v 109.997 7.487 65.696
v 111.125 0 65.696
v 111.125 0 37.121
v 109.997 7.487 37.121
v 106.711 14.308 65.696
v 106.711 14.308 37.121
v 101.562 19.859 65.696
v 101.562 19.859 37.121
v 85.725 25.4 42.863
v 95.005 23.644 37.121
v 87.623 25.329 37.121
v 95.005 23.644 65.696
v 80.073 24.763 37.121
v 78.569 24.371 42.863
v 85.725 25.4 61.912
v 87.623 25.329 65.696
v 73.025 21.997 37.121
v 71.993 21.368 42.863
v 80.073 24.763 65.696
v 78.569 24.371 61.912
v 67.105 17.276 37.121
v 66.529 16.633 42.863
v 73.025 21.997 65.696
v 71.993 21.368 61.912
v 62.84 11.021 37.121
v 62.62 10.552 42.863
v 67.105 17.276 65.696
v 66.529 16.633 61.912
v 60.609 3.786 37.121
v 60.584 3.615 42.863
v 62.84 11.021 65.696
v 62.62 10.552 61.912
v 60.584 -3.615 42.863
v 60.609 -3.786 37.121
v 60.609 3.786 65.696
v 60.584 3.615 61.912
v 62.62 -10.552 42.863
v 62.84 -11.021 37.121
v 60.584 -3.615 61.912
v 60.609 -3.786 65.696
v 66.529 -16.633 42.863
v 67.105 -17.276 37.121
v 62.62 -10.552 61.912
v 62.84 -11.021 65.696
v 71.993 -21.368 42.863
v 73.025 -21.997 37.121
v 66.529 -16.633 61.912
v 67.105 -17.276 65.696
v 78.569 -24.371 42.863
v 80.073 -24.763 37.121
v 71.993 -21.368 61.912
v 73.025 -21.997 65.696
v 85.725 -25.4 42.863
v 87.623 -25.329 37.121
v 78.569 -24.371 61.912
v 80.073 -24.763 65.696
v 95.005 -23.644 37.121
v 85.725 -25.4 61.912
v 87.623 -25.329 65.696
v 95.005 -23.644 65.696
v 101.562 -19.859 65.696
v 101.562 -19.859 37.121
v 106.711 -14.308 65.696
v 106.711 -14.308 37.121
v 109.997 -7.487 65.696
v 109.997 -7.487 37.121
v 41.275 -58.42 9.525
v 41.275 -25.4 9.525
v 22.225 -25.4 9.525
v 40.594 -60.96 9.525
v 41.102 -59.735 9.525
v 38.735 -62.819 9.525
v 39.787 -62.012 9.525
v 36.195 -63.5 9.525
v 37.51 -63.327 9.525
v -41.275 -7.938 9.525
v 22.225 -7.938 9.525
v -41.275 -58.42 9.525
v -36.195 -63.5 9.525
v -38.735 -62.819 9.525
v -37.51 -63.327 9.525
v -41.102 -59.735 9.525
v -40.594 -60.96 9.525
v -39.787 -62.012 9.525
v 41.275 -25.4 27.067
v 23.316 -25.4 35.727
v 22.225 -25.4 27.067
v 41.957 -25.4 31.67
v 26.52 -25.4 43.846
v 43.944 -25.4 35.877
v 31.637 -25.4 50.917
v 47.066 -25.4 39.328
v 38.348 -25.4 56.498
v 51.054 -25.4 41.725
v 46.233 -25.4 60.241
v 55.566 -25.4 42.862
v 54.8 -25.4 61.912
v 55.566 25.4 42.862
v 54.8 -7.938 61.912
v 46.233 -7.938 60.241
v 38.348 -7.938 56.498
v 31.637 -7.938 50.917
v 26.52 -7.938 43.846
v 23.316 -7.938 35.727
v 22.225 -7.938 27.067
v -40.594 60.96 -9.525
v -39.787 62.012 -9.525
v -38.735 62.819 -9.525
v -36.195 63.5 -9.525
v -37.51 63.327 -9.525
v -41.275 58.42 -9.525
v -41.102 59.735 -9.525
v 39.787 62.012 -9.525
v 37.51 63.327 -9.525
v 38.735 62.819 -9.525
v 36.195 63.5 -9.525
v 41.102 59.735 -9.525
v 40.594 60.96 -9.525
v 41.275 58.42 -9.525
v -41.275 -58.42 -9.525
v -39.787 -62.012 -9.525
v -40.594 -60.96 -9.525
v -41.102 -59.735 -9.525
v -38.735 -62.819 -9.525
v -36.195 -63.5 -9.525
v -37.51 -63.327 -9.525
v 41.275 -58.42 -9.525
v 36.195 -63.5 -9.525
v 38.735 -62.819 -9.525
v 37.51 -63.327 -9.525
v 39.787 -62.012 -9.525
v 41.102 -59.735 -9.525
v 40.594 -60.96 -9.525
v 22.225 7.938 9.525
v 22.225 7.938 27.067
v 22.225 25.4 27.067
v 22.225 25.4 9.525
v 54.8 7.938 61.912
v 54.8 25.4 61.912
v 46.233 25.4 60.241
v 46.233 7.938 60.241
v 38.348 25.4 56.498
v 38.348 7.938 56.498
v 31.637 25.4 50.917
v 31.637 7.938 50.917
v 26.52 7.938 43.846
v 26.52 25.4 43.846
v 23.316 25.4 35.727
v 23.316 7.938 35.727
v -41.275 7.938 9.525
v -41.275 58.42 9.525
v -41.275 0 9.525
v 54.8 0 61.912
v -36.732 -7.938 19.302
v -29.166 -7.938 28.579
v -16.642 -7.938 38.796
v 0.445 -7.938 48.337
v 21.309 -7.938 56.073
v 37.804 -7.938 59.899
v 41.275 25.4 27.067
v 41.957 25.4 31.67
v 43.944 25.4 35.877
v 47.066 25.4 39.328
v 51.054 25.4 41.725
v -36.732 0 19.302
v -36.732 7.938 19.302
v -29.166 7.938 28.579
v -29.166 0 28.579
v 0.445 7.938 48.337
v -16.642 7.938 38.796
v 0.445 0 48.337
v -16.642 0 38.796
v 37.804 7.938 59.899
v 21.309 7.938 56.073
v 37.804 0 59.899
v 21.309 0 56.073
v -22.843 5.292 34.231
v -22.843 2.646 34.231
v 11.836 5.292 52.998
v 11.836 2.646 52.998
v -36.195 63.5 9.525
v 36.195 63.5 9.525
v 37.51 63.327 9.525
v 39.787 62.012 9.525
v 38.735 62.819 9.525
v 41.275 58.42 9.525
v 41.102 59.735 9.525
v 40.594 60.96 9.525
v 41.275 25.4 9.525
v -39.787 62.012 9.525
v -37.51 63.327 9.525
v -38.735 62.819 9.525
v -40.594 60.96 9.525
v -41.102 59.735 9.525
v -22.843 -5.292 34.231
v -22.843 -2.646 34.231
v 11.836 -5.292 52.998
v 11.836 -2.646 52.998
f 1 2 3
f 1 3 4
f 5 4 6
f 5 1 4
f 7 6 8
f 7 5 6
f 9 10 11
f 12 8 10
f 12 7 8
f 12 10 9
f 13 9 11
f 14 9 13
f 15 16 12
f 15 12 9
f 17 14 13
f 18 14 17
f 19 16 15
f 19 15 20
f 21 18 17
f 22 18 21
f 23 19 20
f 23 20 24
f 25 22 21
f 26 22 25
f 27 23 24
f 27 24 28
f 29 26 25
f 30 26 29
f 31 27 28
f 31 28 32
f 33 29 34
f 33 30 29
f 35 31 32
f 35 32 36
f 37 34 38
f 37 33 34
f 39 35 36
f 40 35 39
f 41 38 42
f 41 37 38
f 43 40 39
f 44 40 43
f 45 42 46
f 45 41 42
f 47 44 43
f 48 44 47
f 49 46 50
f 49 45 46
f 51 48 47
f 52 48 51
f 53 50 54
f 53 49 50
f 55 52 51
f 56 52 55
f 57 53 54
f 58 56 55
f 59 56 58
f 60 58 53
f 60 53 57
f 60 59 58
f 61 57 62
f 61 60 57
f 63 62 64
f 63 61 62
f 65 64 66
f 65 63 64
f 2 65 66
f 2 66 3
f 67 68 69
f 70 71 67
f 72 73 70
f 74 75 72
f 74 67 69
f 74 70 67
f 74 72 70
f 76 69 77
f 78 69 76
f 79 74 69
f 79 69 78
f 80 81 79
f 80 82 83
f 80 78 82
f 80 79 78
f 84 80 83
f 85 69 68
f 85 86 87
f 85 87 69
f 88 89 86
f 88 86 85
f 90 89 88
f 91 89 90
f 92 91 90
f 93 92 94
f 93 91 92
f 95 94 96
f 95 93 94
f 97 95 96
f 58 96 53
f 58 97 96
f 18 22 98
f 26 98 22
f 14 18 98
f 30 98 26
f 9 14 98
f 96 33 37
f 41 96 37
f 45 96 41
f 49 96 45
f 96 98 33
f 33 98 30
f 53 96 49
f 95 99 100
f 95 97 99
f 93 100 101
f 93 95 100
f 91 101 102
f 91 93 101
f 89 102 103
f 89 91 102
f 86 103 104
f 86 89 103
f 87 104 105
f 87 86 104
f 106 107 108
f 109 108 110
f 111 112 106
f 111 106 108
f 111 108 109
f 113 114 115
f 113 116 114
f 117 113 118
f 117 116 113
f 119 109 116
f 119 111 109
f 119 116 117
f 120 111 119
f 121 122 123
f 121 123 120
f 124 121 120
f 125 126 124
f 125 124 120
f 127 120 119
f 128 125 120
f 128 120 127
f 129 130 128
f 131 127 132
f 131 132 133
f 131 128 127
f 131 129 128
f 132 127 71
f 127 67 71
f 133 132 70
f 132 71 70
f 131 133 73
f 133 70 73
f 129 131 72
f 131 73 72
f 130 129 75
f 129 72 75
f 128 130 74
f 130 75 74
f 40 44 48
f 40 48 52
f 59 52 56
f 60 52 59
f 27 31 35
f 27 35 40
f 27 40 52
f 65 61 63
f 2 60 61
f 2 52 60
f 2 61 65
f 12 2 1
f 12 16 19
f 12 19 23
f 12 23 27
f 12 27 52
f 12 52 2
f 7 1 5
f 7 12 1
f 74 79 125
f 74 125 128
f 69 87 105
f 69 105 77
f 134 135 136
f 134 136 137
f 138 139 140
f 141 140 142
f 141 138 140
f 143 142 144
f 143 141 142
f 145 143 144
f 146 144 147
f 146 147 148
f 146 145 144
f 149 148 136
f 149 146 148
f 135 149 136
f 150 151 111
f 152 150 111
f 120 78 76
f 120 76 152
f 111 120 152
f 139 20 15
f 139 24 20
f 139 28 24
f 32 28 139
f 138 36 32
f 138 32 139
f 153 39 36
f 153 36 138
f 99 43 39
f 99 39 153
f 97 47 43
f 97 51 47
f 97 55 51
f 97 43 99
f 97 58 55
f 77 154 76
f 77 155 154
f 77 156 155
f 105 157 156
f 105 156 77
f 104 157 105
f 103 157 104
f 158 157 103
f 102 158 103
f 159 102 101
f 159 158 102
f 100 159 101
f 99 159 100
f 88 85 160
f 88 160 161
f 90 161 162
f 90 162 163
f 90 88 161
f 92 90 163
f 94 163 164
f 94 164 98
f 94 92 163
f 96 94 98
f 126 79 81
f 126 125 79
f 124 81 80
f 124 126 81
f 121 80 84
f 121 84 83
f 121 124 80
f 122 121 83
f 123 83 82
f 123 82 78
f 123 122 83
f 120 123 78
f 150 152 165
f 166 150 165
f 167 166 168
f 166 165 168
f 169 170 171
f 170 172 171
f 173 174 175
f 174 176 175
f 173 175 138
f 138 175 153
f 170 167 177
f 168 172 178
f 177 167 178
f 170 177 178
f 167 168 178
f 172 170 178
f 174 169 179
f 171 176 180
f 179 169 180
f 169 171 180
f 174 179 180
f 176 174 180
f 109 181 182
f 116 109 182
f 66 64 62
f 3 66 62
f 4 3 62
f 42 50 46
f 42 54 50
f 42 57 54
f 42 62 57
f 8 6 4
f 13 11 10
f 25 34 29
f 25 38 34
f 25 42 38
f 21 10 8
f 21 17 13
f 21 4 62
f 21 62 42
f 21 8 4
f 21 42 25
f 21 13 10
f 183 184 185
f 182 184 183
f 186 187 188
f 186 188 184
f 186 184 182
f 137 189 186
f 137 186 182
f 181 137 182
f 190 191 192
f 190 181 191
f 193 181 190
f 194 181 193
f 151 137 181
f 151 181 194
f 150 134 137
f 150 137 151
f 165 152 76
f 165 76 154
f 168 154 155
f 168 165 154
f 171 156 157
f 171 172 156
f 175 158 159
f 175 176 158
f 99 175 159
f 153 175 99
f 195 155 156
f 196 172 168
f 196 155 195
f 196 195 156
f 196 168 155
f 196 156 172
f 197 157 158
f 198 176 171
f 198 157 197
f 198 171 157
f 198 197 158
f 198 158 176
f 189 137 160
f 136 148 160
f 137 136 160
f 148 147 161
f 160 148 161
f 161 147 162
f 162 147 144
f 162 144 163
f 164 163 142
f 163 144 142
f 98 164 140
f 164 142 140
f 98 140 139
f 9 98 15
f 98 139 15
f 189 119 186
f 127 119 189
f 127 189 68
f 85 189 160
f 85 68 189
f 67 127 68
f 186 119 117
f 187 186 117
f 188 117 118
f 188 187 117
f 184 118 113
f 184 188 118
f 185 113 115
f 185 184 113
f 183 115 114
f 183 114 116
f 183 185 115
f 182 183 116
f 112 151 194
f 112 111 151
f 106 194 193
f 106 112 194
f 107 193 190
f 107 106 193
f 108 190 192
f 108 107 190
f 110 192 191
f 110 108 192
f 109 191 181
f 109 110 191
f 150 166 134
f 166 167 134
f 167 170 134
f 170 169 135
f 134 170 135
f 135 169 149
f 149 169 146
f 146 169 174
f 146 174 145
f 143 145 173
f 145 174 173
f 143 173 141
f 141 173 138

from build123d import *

# Parameters (mm, degrees)
F1_DEPTH = 63.5
F0_W     = 25.4
F0_H     = 19.05
F2_DEPTH = 25.4
F3_DEPTH = 7.9375
F5_R     = 5.08


with BuildPart() as f1:
    # F0 (on Front) → F1 (new body, symmetric)
    with BuildSketch(Plane.XZ):
        Polygon((41.275, -9.525), (41.275, 9.525), (22.225, 9.525), (-41.275, 9.525), (-41.275, -9.525), align=None)
    extrude(amount=F1_DEPTH, both=True)

    # F0 (on Front) → F2 (join, symmetric)
    with BuildSketch(Plane.XZ):
        with BuildLine():
            Line((22.225, 9.525), (41.275, 9.525))
            Line((41.275, 9.525), (41.275, 27.0666779783))
            ThreePointArc((41.275, 27.0666779783), (45.3781164095, 37.7174235733), (55.566449667, 42.8625))
            Line((55.566449667, 42.8625), (60.325, 42.8625))
            Line((60.325, 42.8625), (60.325, 61.9125))
            Line((60.325, 61.9125), (54.799614366, 61.9125))
            ThreePointArc((54.799614366, 61.9125), (31.6368382666, 50.9169233306), (22.225, 27.0666779783))
            Line((22.225, 27.0666779783), (22.225, 9.525))
        make_face()
        with Locations((73.025, 52.3875)):
            Rectangle(F0_W, F0_H)
    extrude(amount=F2_DEPTH, both=True)

    # F0 (on Front) → F3 (join, symmetric)
    with BuildSketch(Plane.XZ):
        with BuildLine():
            Line((-41.275, 9.525), (22.225, 9.525))
            Line((22.225, 9.525), (22.225, 27.0666779783))
            ThreePointArc((22.225, 27.0666779783), (31.6368382666, 50.9169233306), (54.799614366, 61.9125))
            add(Edge.make_bspline(
                [(-41.275, 9.525), (-33.6213931441, 35.8969122171), (10.3490389884, 59.2281594872), (54.799614366, 61.9125)],
                knots=[0, 0, 0, 0, 109.4293456154, 109.4293456154, 109.4293456154, 109.4293456154], degree=3))
        make_face()
    extrude(amount=F3_DEPTH, both=True)

    # F0 (on Front) → F4 (revolve)
    with BuildSketch(Plane.XZ):
        Polygon((85.725, 61.9125), (85.725, 42.8625), (85.725, 37.1208467424), (111.125, 37.1208467424), (111.125, 65.6958467424), (85.725, 65.6958467424), align=None)
    revolve(axis=Axis((85.725, 0, 51.4083467424), (0, 0, 1)))

    # F5
    f5_edges = [f1.edges().sort_by_distance(p)[0] for p in [
        (41.275, -63.5, 0),
        (41.275, 63.5, 0),
        (-41.275, -63.5, 0),
        (-41.275, 63.5, 0),
        (41.275, 0, 27.066678),
    ]]
    fillet(f5_edges, radius=F5_R)


solid = f1.part
